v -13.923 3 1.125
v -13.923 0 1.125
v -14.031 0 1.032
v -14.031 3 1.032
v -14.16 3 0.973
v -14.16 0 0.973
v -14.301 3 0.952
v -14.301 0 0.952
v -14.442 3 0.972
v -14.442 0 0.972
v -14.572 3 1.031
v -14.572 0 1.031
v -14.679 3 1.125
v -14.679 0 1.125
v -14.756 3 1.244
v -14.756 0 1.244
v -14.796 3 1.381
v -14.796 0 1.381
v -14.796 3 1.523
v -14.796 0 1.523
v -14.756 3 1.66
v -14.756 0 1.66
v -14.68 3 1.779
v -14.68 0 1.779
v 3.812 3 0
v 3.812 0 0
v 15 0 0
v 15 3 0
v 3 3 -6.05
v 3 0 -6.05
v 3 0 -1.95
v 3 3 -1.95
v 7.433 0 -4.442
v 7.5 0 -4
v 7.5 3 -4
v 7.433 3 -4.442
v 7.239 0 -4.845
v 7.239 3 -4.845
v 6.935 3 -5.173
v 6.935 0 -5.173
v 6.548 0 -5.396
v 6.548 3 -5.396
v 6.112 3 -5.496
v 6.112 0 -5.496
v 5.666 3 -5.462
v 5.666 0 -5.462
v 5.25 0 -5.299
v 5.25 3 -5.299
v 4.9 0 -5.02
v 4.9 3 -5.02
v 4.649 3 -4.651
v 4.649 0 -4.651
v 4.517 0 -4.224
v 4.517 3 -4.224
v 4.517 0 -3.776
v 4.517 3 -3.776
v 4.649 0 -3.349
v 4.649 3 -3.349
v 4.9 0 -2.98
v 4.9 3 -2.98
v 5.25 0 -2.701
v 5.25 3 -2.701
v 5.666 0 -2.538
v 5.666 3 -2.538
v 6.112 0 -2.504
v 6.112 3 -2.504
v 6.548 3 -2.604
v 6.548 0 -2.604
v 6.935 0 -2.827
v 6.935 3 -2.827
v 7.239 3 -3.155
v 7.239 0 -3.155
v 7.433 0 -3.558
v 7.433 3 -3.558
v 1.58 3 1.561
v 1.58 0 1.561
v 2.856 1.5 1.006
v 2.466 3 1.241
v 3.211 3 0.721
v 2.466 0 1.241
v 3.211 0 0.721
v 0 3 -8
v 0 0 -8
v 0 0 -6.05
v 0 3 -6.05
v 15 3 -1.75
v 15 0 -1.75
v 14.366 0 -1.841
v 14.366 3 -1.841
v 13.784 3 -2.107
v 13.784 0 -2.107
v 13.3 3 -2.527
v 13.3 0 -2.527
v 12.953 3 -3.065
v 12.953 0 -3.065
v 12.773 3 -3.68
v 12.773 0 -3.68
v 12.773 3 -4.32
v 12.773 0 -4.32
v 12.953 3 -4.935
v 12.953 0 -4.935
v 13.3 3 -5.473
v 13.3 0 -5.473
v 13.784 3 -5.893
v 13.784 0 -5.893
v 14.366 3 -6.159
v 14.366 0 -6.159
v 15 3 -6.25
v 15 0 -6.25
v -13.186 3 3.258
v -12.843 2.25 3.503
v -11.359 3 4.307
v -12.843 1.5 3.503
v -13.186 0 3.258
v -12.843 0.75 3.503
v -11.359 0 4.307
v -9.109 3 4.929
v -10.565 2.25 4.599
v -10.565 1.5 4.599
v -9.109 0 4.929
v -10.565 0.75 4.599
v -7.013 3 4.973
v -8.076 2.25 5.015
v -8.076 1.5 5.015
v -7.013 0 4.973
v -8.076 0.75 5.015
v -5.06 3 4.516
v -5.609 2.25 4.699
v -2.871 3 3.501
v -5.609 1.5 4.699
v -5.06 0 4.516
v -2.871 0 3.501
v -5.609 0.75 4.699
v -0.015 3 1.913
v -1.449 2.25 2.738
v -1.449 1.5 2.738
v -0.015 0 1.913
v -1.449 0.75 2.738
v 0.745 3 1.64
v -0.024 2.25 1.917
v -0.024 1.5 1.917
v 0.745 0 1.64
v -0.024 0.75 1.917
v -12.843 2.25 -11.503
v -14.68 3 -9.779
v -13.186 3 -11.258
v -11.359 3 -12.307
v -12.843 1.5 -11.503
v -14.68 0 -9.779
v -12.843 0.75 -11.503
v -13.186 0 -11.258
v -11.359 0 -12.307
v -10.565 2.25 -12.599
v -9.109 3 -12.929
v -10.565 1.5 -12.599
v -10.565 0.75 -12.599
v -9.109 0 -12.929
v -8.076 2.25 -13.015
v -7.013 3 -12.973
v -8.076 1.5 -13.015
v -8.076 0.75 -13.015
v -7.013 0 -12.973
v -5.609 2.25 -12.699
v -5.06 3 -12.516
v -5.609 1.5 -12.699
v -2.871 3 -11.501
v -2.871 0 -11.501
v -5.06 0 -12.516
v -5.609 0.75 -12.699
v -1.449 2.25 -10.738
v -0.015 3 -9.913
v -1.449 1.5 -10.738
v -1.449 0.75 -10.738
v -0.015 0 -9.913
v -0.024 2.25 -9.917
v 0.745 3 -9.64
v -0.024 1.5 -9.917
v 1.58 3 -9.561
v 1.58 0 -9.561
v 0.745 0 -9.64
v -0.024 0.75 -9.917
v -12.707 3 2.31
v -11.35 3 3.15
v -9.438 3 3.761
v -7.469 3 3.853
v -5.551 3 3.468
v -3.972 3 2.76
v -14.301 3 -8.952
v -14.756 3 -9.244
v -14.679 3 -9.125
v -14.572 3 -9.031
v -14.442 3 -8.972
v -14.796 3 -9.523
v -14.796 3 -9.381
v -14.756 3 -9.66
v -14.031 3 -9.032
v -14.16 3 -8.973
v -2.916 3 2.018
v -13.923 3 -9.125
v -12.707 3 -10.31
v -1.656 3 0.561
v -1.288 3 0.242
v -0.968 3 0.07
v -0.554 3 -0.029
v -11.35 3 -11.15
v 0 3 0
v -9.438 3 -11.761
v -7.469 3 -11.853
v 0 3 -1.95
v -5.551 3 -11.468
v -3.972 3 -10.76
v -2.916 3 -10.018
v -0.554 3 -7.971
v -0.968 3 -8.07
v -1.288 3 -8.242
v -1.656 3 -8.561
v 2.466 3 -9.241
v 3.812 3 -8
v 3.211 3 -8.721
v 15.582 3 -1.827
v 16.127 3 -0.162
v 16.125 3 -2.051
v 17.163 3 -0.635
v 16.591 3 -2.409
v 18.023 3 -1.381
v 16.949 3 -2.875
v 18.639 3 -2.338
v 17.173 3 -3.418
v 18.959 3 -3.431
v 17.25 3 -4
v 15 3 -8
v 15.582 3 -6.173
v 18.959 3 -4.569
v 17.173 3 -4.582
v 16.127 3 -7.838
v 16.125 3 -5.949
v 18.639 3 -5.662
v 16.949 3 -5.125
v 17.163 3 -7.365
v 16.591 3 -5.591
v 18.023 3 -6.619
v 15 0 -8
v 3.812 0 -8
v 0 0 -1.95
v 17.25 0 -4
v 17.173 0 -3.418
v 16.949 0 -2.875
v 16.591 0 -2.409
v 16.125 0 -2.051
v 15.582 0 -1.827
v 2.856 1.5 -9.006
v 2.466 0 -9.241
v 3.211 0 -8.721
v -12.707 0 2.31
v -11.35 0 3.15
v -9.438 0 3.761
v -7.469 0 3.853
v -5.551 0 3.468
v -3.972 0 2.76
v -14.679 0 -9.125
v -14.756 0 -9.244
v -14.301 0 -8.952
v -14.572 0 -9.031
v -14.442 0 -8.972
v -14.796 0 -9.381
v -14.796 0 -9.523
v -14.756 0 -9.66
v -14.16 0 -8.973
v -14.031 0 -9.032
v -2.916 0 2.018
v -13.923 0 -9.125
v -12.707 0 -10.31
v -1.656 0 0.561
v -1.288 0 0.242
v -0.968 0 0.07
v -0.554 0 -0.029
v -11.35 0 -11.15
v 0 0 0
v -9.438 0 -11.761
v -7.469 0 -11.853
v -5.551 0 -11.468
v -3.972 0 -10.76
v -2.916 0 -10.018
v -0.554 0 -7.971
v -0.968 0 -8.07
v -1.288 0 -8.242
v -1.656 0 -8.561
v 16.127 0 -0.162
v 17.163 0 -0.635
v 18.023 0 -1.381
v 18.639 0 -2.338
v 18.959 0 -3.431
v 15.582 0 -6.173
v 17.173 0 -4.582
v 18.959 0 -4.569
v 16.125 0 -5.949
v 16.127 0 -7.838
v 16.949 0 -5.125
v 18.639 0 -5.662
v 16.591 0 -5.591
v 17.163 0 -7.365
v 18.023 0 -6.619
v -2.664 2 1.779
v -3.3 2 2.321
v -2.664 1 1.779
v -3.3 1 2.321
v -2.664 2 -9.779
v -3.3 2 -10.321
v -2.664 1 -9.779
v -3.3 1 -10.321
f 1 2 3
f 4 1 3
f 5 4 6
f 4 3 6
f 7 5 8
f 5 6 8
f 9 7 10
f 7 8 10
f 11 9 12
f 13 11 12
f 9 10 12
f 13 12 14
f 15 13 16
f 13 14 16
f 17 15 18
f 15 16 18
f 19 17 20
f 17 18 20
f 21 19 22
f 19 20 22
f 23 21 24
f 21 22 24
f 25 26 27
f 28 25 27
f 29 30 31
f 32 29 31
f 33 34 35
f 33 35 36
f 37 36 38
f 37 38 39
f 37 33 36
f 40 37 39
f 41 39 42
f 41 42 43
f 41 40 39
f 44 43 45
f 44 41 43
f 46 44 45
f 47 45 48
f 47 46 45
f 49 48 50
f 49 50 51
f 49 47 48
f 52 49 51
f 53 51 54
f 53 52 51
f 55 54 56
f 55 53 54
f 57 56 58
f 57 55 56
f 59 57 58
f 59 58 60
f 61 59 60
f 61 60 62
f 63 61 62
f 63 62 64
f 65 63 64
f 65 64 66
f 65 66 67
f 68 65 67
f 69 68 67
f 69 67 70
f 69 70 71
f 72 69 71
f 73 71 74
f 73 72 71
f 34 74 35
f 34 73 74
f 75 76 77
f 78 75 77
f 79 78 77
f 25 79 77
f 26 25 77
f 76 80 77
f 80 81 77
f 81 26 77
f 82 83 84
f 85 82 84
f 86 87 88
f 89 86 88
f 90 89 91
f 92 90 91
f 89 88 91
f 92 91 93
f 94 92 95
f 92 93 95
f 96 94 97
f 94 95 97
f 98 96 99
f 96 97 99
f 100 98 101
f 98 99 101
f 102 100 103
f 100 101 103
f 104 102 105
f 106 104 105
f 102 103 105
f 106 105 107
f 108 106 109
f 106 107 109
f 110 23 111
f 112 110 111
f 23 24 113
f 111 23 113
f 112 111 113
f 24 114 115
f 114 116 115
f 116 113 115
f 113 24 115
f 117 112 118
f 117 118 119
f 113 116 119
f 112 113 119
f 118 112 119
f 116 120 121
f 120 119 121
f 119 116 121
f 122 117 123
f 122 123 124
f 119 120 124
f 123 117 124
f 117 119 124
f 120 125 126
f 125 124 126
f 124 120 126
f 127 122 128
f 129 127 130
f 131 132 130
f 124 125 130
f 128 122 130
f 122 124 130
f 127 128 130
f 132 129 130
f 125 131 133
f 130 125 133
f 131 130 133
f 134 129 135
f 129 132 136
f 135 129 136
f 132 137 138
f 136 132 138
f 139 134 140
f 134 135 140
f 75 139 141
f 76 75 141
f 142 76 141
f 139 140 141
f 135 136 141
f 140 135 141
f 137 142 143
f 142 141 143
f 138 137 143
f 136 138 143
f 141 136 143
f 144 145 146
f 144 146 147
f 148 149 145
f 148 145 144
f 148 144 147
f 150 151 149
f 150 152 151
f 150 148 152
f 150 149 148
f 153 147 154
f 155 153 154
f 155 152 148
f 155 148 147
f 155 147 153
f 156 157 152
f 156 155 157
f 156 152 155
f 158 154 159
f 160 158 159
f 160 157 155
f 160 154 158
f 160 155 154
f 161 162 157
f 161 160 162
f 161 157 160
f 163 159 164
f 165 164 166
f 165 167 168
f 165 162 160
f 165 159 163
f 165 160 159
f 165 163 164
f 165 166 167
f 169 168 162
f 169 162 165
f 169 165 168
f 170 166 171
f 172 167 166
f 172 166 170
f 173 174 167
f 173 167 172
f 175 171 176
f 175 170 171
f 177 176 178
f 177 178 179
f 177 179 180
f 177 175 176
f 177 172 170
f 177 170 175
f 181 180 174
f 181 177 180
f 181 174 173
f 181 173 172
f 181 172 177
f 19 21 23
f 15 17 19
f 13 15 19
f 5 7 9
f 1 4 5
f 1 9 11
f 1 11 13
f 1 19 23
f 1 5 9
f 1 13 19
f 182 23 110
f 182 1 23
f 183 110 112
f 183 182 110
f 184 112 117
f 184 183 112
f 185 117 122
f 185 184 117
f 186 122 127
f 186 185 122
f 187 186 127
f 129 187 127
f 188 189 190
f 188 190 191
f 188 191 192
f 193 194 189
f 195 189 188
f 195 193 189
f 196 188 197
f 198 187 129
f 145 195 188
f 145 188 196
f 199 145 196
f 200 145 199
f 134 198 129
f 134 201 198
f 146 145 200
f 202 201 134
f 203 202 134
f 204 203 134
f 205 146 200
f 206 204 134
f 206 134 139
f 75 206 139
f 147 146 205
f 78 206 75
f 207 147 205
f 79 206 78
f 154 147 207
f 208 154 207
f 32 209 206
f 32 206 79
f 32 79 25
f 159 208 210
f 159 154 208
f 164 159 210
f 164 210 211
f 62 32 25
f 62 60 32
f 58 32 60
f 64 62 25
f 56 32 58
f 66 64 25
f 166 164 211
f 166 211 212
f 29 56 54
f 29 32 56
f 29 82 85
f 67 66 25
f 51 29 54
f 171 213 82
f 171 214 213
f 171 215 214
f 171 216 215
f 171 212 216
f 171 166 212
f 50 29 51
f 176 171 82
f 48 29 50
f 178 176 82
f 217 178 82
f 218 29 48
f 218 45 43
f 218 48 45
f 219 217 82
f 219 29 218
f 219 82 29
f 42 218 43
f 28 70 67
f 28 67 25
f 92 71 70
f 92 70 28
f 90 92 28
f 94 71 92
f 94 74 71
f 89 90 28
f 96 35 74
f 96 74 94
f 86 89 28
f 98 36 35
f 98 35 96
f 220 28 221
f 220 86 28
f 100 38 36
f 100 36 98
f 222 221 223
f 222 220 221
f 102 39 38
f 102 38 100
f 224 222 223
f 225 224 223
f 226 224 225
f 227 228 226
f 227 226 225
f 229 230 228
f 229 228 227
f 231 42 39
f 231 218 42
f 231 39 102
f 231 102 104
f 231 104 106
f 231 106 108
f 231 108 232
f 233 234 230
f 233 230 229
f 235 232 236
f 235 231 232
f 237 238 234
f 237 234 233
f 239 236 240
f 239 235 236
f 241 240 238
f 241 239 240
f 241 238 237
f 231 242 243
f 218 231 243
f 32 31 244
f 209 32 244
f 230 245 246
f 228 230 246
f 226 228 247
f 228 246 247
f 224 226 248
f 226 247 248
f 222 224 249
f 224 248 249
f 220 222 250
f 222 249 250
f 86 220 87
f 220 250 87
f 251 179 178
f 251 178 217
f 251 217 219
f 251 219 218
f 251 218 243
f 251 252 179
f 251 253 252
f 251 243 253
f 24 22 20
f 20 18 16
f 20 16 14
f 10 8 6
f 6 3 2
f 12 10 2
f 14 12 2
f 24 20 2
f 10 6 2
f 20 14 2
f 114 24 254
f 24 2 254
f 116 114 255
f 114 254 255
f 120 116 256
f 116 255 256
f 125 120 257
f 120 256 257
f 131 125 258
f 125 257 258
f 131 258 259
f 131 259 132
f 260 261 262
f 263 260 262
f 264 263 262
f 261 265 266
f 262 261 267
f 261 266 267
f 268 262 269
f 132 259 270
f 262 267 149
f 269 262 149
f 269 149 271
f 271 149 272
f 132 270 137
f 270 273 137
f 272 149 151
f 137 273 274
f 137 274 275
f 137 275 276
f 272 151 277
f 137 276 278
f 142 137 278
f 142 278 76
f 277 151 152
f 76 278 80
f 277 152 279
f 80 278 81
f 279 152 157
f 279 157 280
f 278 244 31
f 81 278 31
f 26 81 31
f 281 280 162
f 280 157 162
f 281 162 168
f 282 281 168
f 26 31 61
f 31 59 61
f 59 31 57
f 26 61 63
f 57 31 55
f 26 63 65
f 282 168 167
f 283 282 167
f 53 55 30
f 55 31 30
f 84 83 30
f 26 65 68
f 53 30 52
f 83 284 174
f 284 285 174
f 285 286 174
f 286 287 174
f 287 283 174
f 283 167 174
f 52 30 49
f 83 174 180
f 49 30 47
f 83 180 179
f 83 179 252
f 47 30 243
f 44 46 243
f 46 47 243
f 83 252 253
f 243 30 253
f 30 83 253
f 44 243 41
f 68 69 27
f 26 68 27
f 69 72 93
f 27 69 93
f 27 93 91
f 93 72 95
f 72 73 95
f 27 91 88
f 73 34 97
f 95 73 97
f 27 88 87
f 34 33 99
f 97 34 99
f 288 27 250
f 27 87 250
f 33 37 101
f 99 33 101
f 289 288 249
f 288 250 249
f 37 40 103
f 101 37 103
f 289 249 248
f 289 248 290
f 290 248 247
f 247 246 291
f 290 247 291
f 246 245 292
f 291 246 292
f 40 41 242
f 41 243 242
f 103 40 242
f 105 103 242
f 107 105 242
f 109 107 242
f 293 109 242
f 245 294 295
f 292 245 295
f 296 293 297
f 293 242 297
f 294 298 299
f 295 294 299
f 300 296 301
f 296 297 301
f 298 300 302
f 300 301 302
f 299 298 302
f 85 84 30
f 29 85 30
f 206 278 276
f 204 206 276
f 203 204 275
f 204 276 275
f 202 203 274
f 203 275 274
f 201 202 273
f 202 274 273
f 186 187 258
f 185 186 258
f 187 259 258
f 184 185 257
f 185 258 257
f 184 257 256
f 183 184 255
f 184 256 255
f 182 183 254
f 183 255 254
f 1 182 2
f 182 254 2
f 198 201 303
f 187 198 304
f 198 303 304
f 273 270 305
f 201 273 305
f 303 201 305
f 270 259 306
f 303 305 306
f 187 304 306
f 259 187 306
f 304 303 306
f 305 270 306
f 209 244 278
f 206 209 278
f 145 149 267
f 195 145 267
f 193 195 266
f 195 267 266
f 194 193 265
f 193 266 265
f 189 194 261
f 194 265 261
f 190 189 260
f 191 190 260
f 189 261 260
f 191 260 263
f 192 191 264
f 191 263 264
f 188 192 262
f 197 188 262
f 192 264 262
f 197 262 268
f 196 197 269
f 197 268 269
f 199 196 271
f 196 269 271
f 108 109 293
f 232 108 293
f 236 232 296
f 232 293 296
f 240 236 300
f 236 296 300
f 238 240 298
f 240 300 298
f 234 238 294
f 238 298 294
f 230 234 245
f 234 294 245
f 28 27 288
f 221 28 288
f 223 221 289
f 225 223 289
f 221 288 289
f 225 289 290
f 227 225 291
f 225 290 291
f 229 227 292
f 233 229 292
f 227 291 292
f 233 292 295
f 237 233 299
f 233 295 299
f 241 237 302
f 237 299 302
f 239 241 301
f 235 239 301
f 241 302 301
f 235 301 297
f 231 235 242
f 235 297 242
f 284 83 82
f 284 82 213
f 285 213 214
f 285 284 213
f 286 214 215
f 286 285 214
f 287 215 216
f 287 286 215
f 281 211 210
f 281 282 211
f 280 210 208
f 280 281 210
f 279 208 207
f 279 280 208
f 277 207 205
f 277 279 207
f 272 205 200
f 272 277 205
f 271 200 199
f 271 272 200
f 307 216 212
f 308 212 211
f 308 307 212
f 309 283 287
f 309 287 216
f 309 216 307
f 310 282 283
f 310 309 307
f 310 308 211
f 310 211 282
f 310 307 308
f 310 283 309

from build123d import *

# Parameters (mm, degrees)
SKETCH1_R           = 1.5
BOSS_EXTRUDE1_DEPTH = 3


with BuildPart() as part:
    # Sketch1 → Boss-Extrude1 (new body)
    with BuildSketch(Plane(origin=(0, 0, 0), x_dir=(1, 0, 0), z_dir=(0, 1, 0))):
        with BuildLine():
            Line((0, 1.95), (0, 0))
            Line((0, 0), (1.462394889, 0))
            Line((1.462394889, 0), (3.812496302, 0))
            Line((3.812496302, 0), (15, 0))
            Line((15, 0), (15, 1.75))
            ThreePointArc((15, 1.75), (12.75, 4), (15, 6.25))
            Line((15, 6.25), (15, 8))
            Line((15, 8), (3.812496302, 8))
            Line((3.812496302, 8), (0, 8))
            Line((0, 8), (0, 6.05))
            Line((0, 6.05), (3, 6.05))
            Line((3, 6.05), (3, 1.95))
            Line((3, 1.95), (0, 1.95))
        make_face()
        with Locations((6, 4)):
            Circle(SKETCH1_R, mode=Mode.SUBTRACT)
        with BuildLine():
            Line((1.462394889, 0), (0, 0))
            add(Edge.make_bspline(
                [(0, 0), (-1.444972113, 0.268364939), (-1.989778669, -1.274793611), (-5.99641862, -4.532476754), (-11.043579326, -4.596412752), (-13.923421089, -1.125163293)],
                knots=[0, 0, 0, 0, 0.216898357, 0.270831116, 1, 1, 1, 1], degree=3))
            ThreePointArc((-13.923421089, -1.125163293), (-14.628689505, -1.074207804), (-14.679644993, -1.77947622))
            add(Edge.make_bspline(
                [(-14.679644993, -1.77947622), (-12.628894453, -4.474080979), (-7.714296312, -5.95140451), (-3.34534031, -3.74006244), (-1.005631641, -2.560185408), (0.394595325, -1.501153093), (1.579778317, -1.560661502)],
                knots=[0, 0, 0, 0, 0.557352672, 0.711946673, 0.815566185, 1, 1, 1, 1], degree=3))
            Line((1.579778317, -1.560661502), (1.462394889, 0))
        make_face()
        with BuildLine():
            Line((3.812496302, 0), (1.462394889, 0))
            Line((1.462394889, 0), (1.579778317, -1.560661502))
            add(Edge.make_bspline(
                [(1.579778317, -1.560661502), (3.016371883, -1.23196193), (3.812496302, 0)],
                knots=[0, 0, 0, 1, 1, 1], degree=2))
        make_face()
        with BuildLine():
            Line((15, 1.75), (15, 0))
            ThreePointArc((15, 0), (19, 4), (15, 8))
            Line((15, 8), (15, 6.25))
            ThreePointArc((15, 6.25), (16.590990258, 5.590990258), (17.25, 4))
            ThreePointArc((17.25, 4), (16.590990258, 2.409009742), (15, 1.75))
        make_face()
        with BuildLine():
            add(Edge.make_bspline(
                [(0, 8), (-1.444972113, 7.731635061), (-1.989778669, 9.274793611), (-5.99641862, 12.532476754), (-11.043579326, 12.596412752), (-13.923421089, 9.125163293)],
                knots=[0, 0, 0, 0, 0.216898357, 0.270831116, 1, 1, 1, 1], degree=3))
            Line((0, 8), (3.812496302, 8))
            add(Edge.make_bspline(
                [(1.579778317, 9.560661502), (3.016371883, 9.23196193), (3.812496302, 8)],
                knots=[0, 0, 0, 1, 1, 1], degree=2))
            add(Edge.make_bspline(
                [(-14.679644993, 9.77947622), (-12.628894453, 12.474080979), (-7.714296312, 13.95140451), (-3.34534031, 11.74006244), (-1.005631641, 10.560185408), (0.394595325, 9.501153093), (1.579778317, 9.560661502)],
                knots=[0, 0, 0, 0, 0.557352672, 0.711946673, 0.815566185, 1, 1, 1, 1], degree=3))
            Line((-14.679644993, 9.77947622), (-13.923421089, 9.125163293))
        make_face()
        with BuildLine():
            ThreePointArc((-14.679644993, 9.77947622), (-14.628689505, 9.074207804), (-13.923421089, 9.125163293))
            Line((-13.923421089, 9.125163293), (-14.679644993, 9.77947622))
        make_face()
    extrude(amount=BOSS_EXTRUDE1_DEPTH)


solid = part.part
